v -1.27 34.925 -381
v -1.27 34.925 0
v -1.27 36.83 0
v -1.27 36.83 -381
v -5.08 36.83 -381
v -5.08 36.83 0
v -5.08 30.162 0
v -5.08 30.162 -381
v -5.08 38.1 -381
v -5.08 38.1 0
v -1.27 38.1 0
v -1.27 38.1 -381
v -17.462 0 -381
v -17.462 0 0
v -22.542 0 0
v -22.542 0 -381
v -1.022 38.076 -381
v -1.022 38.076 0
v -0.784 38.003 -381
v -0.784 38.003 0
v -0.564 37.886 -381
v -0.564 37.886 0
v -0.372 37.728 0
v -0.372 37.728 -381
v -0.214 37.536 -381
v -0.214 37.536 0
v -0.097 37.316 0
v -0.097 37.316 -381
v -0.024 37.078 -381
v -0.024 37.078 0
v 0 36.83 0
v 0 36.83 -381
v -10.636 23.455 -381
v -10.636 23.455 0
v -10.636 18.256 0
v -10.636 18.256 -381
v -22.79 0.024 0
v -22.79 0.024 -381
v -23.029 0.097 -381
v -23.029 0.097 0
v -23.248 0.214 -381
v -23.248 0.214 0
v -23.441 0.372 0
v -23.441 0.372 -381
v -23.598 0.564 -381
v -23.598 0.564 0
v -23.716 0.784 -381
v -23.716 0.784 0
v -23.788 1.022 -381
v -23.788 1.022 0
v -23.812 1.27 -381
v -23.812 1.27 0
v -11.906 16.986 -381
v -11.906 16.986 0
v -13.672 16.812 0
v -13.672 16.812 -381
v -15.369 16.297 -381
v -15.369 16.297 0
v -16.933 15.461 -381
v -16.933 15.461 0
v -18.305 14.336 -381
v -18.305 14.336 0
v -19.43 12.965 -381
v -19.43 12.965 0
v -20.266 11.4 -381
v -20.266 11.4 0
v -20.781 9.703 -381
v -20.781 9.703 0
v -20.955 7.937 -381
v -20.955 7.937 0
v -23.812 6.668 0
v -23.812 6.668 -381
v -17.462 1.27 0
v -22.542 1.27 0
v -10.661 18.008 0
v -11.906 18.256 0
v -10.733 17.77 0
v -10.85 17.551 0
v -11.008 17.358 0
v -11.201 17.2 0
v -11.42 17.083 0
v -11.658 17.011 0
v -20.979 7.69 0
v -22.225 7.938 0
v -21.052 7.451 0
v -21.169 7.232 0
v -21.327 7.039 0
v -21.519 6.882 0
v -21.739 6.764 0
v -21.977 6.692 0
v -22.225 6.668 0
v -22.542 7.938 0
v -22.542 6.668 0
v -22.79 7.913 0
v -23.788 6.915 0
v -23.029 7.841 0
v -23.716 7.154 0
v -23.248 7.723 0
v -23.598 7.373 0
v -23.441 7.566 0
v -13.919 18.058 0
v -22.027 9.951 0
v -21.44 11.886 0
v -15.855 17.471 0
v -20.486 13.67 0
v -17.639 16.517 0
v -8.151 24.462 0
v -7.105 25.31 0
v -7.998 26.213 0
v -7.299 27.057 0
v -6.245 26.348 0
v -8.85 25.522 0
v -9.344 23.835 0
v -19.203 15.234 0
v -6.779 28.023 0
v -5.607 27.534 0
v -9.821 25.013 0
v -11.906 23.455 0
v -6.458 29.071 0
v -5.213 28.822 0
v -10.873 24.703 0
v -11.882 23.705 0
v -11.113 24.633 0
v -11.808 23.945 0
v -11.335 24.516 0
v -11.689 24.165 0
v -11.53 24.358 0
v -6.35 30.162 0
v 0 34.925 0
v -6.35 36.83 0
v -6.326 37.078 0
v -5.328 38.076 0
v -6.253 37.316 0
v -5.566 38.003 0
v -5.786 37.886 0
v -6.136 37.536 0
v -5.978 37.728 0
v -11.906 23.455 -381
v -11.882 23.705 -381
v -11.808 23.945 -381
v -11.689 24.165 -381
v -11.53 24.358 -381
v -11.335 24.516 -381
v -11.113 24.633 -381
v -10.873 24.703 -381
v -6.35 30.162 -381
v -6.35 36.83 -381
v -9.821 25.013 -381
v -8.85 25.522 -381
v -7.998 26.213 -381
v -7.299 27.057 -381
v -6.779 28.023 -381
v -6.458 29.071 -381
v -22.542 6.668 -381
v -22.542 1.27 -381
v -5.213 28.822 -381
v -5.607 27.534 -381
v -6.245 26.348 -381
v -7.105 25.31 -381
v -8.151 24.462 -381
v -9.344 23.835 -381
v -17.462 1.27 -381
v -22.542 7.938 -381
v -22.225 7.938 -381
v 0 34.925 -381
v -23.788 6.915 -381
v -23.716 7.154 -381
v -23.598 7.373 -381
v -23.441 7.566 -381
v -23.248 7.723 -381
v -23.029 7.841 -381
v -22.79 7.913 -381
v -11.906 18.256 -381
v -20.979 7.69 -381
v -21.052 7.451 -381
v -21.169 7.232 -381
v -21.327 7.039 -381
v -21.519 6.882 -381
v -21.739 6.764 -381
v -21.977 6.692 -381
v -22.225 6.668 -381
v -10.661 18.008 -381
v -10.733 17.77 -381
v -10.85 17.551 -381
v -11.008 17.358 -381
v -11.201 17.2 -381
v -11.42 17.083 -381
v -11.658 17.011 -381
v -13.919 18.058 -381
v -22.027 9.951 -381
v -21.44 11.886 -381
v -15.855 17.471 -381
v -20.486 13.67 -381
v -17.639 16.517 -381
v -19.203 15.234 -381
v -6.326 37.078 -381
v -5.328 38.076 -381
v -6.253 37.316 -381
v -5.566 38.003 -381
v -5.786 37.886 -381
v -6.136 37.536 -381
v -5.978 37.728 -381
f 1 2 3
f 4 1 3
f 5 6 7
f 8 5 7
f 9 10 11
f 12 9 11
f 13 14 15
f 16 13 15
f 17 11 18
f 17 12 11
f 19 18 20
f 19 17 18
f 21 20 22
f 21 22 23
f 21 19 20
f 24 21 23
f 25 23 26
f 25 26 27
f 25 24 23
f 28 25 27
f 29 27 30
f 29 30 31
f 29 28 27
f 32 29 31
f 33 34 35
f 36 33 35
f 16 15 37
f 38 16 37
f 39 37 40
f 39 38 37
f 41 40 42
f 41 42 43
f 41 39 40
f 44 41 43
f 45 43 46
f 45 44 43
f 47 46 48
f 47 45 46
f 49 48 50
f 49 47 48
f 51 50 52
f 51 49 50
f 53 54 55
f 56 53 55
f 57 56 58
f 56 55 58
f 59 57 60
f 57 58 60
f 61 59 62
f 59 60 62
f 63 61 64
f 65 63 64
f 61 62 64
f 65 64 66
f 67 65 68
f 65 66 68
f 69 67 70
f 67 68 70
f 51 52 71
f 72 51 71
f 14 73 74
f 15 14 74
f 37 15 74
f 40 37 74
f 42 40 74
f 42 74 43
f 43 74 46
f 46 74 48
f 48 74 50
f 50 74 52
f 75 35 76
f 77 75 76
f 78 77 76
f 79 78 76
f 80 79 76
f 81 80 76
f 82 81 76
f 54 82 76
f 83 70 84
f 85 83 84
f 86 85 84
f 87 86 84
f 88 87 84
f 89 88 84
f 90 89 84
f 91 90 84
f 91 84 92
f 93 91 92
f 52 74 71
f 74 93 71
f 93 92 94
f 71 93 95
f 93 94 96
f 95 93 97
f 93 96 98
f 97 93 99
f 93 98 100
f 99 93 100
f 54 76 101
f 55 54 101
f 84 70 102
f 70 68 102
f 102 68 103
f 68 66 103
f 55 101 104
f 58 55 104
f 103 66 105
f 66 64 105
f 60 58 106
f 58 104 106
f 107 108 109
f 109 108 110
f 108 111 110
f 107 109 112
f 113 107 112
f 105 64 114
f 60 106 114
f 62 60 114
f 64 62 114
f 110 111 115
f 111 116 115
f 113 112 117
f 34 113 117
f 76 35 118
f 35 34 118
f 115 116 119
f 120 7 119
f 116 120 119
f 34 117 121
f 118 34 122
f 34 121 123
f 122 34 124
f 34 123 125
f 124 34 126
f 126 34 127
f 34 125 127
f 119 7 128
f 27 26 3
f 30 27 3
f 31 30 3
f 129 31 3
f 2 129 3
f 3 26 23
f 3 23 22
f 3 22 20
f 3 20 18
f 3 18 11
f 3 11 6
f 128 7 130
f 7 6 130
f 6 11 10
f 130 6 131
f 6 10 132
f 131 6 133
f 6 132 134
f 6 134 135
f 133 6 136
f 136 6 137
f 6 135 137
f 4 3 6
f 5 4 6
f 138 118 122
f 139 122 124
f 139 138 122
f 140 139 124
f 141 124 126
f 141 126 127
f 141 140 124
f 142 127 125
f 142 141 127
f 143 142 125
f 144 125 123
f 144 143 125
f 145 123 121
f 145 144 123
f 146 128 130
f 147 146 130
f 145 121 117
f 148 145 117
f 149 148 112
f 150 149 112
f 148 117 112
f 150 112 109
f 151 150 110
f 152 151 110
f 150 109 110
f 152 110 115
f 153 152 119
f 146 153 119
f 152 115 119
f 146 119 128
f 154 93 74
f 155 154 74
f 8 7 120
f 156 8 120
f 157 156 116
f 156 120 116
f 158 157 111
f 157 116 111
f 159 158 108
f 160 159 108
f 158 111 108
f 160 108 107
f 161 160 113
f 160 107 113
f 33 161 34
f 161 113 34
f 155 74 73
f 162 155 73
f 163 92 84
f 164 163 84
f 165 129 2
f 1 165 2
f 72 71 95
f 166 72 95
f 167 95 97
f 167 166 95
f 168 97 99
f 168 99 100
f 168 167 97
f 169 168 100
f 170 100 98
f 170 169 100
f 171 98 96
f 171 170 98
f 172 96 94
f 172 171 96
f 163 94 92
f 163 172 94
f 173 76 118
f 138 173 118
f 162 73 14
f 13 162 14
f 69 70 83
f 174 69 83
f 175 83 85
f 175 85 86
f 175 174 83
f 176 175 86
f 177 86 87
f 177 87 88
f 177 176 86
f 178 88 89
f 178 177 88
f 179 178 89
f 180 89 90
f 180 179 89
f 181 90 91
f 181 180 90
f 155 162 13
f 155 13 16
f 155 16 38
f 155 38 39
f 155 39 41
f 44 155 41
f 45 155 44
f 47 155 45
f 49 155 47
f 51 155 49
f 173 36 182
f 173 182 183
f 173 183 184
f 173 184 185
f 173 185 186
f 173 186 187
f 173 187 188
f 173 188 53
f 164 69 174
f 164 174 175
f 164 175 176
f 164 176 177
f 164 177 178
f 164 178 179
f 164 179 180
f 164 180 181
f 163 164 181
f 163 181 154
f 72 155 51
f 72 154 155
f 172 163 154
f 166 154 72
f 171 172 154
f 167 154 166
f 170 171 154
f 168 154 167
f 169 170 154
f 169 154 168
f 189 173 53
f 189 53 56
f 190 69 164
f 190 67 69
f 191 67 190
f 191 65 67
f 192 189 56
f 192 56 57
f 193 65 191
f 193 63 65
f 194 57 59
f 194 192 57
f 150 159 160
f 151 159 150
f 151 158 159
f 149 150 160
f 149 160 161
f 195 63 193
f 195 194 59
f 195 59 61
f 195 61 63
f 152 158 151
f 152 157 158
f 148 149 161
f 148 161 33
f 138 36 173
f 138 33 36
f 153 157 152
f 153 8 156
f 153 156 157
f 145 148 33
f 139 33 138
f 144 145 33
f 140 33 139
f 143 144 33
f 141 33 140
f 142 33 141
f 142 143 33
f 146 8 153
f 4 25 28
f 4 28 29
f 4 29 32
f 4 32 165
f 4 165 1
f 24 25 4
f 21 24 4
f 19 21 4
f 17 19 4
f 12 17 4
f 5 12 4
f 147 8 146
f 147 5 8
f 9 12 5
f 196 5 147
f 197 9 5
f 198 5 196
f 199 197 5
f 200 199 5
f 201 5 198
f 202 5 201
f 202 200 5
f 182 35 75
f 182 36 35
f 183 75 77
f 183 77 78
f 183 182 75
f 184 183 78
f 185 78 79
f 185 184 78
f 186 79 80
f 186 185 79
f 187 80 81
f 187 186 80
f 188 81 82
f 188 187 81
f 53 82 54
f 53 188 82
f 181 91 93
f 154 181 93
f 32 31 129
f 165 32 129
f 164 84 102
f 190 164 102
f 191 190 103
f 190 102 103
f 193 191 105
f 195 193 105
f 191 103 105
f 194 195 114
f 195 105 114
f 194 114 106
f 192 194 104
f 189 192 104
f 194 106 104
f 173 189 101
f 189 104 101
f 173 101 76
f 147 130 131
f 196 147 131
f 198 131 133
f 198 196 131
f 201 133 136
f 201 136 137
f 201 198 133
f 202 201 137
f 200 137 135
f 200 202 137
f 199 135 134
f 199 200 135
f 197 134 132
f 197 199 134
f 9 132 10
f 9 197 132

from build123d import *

# Parameters (mm, degrees)
EXTRUDE_THIN1_DEPTH = 381
FILLET1_R           = 1.27


with BuildPart() as part:
    # Sketch1 → Extrude-Thin1 (new body)
    with BuildSketch(Plane.XY):
        with BuildLine():
            Line((-17.4625, 0), (-23.8125, 0))
            Line((-23.8125, 0), (-23.8125, 7.9375))
            Line((-23.8125, 7.9375), (-22.225, 7.9375))
            ThreePointArc((-22.225, 7.9375), (-19.202708098, 15.233958098), (-11.90625, 18.25625))
            Line((-11.90625, 18.25625), (-11.90625, 24.60625))
            ThreePointArc((-11.90625, 24.60625), (-7.977387947, 26.233637947), (-6.35, 30.1625))
            Line((-6.35, 30.1625), (-6.35, 38.1))
            Line((-6.35, 38.1), (0, 38.1))
            Line((0, 38.1), (0, 34.925))
            Line((0, 34.925), (-1.27, 34.925))
            Line((-1.27, 34.925), (-1.27, 36.83))
            Line((-1.27, 36.83), (-5.08, 36.83))
            Line((-5.08, 36.83), (-5.08, 30.1625))
            ThreePointArc((-5.08, 30.1625), (-6.649491181, 25.807712315), (-10.63625, 23.45542992))
            Line((-10.63625, 23.45542992), (-10.63625, 16.896683923))
            ThreePointArc((-10.63625, 16.896683923), (-18.304682486, 14.335932486), (-20.865433923, 6.6675))
            Line((-20.865433923, 6.6675), (-22.5425, 6.6675))
            Line((-22.5425, 6.6675), (-22.5425, 1.27))
            Line((-22.5425, 1.27), (-17.4625, 1.27))
            Line((-17.4625, 1.27), (-17.4625, 0))
        make_face()
    extrude(amount=-EXTRUDE_THIN1_DEPTH)

    # Fillet1
    fillet1_edges = [part.edges().sort_by_distance(p)[0] for p in [
        (-10.63625, 16.896683923, -190.5),
        (-20.865433923, 6.6675, -190.5),
        (-23.8125, 0, -190.5),
        (-23.8125, 7.9375, -190.5),
        (-11.90625, 24.60625, -190.5),
        (-6.35, 38.1, -190.5),
        (0, 38.1, -190.5),
    ]]
    fillet(fillet1_edges, radius=FILLET1_R)


solid = part.part
